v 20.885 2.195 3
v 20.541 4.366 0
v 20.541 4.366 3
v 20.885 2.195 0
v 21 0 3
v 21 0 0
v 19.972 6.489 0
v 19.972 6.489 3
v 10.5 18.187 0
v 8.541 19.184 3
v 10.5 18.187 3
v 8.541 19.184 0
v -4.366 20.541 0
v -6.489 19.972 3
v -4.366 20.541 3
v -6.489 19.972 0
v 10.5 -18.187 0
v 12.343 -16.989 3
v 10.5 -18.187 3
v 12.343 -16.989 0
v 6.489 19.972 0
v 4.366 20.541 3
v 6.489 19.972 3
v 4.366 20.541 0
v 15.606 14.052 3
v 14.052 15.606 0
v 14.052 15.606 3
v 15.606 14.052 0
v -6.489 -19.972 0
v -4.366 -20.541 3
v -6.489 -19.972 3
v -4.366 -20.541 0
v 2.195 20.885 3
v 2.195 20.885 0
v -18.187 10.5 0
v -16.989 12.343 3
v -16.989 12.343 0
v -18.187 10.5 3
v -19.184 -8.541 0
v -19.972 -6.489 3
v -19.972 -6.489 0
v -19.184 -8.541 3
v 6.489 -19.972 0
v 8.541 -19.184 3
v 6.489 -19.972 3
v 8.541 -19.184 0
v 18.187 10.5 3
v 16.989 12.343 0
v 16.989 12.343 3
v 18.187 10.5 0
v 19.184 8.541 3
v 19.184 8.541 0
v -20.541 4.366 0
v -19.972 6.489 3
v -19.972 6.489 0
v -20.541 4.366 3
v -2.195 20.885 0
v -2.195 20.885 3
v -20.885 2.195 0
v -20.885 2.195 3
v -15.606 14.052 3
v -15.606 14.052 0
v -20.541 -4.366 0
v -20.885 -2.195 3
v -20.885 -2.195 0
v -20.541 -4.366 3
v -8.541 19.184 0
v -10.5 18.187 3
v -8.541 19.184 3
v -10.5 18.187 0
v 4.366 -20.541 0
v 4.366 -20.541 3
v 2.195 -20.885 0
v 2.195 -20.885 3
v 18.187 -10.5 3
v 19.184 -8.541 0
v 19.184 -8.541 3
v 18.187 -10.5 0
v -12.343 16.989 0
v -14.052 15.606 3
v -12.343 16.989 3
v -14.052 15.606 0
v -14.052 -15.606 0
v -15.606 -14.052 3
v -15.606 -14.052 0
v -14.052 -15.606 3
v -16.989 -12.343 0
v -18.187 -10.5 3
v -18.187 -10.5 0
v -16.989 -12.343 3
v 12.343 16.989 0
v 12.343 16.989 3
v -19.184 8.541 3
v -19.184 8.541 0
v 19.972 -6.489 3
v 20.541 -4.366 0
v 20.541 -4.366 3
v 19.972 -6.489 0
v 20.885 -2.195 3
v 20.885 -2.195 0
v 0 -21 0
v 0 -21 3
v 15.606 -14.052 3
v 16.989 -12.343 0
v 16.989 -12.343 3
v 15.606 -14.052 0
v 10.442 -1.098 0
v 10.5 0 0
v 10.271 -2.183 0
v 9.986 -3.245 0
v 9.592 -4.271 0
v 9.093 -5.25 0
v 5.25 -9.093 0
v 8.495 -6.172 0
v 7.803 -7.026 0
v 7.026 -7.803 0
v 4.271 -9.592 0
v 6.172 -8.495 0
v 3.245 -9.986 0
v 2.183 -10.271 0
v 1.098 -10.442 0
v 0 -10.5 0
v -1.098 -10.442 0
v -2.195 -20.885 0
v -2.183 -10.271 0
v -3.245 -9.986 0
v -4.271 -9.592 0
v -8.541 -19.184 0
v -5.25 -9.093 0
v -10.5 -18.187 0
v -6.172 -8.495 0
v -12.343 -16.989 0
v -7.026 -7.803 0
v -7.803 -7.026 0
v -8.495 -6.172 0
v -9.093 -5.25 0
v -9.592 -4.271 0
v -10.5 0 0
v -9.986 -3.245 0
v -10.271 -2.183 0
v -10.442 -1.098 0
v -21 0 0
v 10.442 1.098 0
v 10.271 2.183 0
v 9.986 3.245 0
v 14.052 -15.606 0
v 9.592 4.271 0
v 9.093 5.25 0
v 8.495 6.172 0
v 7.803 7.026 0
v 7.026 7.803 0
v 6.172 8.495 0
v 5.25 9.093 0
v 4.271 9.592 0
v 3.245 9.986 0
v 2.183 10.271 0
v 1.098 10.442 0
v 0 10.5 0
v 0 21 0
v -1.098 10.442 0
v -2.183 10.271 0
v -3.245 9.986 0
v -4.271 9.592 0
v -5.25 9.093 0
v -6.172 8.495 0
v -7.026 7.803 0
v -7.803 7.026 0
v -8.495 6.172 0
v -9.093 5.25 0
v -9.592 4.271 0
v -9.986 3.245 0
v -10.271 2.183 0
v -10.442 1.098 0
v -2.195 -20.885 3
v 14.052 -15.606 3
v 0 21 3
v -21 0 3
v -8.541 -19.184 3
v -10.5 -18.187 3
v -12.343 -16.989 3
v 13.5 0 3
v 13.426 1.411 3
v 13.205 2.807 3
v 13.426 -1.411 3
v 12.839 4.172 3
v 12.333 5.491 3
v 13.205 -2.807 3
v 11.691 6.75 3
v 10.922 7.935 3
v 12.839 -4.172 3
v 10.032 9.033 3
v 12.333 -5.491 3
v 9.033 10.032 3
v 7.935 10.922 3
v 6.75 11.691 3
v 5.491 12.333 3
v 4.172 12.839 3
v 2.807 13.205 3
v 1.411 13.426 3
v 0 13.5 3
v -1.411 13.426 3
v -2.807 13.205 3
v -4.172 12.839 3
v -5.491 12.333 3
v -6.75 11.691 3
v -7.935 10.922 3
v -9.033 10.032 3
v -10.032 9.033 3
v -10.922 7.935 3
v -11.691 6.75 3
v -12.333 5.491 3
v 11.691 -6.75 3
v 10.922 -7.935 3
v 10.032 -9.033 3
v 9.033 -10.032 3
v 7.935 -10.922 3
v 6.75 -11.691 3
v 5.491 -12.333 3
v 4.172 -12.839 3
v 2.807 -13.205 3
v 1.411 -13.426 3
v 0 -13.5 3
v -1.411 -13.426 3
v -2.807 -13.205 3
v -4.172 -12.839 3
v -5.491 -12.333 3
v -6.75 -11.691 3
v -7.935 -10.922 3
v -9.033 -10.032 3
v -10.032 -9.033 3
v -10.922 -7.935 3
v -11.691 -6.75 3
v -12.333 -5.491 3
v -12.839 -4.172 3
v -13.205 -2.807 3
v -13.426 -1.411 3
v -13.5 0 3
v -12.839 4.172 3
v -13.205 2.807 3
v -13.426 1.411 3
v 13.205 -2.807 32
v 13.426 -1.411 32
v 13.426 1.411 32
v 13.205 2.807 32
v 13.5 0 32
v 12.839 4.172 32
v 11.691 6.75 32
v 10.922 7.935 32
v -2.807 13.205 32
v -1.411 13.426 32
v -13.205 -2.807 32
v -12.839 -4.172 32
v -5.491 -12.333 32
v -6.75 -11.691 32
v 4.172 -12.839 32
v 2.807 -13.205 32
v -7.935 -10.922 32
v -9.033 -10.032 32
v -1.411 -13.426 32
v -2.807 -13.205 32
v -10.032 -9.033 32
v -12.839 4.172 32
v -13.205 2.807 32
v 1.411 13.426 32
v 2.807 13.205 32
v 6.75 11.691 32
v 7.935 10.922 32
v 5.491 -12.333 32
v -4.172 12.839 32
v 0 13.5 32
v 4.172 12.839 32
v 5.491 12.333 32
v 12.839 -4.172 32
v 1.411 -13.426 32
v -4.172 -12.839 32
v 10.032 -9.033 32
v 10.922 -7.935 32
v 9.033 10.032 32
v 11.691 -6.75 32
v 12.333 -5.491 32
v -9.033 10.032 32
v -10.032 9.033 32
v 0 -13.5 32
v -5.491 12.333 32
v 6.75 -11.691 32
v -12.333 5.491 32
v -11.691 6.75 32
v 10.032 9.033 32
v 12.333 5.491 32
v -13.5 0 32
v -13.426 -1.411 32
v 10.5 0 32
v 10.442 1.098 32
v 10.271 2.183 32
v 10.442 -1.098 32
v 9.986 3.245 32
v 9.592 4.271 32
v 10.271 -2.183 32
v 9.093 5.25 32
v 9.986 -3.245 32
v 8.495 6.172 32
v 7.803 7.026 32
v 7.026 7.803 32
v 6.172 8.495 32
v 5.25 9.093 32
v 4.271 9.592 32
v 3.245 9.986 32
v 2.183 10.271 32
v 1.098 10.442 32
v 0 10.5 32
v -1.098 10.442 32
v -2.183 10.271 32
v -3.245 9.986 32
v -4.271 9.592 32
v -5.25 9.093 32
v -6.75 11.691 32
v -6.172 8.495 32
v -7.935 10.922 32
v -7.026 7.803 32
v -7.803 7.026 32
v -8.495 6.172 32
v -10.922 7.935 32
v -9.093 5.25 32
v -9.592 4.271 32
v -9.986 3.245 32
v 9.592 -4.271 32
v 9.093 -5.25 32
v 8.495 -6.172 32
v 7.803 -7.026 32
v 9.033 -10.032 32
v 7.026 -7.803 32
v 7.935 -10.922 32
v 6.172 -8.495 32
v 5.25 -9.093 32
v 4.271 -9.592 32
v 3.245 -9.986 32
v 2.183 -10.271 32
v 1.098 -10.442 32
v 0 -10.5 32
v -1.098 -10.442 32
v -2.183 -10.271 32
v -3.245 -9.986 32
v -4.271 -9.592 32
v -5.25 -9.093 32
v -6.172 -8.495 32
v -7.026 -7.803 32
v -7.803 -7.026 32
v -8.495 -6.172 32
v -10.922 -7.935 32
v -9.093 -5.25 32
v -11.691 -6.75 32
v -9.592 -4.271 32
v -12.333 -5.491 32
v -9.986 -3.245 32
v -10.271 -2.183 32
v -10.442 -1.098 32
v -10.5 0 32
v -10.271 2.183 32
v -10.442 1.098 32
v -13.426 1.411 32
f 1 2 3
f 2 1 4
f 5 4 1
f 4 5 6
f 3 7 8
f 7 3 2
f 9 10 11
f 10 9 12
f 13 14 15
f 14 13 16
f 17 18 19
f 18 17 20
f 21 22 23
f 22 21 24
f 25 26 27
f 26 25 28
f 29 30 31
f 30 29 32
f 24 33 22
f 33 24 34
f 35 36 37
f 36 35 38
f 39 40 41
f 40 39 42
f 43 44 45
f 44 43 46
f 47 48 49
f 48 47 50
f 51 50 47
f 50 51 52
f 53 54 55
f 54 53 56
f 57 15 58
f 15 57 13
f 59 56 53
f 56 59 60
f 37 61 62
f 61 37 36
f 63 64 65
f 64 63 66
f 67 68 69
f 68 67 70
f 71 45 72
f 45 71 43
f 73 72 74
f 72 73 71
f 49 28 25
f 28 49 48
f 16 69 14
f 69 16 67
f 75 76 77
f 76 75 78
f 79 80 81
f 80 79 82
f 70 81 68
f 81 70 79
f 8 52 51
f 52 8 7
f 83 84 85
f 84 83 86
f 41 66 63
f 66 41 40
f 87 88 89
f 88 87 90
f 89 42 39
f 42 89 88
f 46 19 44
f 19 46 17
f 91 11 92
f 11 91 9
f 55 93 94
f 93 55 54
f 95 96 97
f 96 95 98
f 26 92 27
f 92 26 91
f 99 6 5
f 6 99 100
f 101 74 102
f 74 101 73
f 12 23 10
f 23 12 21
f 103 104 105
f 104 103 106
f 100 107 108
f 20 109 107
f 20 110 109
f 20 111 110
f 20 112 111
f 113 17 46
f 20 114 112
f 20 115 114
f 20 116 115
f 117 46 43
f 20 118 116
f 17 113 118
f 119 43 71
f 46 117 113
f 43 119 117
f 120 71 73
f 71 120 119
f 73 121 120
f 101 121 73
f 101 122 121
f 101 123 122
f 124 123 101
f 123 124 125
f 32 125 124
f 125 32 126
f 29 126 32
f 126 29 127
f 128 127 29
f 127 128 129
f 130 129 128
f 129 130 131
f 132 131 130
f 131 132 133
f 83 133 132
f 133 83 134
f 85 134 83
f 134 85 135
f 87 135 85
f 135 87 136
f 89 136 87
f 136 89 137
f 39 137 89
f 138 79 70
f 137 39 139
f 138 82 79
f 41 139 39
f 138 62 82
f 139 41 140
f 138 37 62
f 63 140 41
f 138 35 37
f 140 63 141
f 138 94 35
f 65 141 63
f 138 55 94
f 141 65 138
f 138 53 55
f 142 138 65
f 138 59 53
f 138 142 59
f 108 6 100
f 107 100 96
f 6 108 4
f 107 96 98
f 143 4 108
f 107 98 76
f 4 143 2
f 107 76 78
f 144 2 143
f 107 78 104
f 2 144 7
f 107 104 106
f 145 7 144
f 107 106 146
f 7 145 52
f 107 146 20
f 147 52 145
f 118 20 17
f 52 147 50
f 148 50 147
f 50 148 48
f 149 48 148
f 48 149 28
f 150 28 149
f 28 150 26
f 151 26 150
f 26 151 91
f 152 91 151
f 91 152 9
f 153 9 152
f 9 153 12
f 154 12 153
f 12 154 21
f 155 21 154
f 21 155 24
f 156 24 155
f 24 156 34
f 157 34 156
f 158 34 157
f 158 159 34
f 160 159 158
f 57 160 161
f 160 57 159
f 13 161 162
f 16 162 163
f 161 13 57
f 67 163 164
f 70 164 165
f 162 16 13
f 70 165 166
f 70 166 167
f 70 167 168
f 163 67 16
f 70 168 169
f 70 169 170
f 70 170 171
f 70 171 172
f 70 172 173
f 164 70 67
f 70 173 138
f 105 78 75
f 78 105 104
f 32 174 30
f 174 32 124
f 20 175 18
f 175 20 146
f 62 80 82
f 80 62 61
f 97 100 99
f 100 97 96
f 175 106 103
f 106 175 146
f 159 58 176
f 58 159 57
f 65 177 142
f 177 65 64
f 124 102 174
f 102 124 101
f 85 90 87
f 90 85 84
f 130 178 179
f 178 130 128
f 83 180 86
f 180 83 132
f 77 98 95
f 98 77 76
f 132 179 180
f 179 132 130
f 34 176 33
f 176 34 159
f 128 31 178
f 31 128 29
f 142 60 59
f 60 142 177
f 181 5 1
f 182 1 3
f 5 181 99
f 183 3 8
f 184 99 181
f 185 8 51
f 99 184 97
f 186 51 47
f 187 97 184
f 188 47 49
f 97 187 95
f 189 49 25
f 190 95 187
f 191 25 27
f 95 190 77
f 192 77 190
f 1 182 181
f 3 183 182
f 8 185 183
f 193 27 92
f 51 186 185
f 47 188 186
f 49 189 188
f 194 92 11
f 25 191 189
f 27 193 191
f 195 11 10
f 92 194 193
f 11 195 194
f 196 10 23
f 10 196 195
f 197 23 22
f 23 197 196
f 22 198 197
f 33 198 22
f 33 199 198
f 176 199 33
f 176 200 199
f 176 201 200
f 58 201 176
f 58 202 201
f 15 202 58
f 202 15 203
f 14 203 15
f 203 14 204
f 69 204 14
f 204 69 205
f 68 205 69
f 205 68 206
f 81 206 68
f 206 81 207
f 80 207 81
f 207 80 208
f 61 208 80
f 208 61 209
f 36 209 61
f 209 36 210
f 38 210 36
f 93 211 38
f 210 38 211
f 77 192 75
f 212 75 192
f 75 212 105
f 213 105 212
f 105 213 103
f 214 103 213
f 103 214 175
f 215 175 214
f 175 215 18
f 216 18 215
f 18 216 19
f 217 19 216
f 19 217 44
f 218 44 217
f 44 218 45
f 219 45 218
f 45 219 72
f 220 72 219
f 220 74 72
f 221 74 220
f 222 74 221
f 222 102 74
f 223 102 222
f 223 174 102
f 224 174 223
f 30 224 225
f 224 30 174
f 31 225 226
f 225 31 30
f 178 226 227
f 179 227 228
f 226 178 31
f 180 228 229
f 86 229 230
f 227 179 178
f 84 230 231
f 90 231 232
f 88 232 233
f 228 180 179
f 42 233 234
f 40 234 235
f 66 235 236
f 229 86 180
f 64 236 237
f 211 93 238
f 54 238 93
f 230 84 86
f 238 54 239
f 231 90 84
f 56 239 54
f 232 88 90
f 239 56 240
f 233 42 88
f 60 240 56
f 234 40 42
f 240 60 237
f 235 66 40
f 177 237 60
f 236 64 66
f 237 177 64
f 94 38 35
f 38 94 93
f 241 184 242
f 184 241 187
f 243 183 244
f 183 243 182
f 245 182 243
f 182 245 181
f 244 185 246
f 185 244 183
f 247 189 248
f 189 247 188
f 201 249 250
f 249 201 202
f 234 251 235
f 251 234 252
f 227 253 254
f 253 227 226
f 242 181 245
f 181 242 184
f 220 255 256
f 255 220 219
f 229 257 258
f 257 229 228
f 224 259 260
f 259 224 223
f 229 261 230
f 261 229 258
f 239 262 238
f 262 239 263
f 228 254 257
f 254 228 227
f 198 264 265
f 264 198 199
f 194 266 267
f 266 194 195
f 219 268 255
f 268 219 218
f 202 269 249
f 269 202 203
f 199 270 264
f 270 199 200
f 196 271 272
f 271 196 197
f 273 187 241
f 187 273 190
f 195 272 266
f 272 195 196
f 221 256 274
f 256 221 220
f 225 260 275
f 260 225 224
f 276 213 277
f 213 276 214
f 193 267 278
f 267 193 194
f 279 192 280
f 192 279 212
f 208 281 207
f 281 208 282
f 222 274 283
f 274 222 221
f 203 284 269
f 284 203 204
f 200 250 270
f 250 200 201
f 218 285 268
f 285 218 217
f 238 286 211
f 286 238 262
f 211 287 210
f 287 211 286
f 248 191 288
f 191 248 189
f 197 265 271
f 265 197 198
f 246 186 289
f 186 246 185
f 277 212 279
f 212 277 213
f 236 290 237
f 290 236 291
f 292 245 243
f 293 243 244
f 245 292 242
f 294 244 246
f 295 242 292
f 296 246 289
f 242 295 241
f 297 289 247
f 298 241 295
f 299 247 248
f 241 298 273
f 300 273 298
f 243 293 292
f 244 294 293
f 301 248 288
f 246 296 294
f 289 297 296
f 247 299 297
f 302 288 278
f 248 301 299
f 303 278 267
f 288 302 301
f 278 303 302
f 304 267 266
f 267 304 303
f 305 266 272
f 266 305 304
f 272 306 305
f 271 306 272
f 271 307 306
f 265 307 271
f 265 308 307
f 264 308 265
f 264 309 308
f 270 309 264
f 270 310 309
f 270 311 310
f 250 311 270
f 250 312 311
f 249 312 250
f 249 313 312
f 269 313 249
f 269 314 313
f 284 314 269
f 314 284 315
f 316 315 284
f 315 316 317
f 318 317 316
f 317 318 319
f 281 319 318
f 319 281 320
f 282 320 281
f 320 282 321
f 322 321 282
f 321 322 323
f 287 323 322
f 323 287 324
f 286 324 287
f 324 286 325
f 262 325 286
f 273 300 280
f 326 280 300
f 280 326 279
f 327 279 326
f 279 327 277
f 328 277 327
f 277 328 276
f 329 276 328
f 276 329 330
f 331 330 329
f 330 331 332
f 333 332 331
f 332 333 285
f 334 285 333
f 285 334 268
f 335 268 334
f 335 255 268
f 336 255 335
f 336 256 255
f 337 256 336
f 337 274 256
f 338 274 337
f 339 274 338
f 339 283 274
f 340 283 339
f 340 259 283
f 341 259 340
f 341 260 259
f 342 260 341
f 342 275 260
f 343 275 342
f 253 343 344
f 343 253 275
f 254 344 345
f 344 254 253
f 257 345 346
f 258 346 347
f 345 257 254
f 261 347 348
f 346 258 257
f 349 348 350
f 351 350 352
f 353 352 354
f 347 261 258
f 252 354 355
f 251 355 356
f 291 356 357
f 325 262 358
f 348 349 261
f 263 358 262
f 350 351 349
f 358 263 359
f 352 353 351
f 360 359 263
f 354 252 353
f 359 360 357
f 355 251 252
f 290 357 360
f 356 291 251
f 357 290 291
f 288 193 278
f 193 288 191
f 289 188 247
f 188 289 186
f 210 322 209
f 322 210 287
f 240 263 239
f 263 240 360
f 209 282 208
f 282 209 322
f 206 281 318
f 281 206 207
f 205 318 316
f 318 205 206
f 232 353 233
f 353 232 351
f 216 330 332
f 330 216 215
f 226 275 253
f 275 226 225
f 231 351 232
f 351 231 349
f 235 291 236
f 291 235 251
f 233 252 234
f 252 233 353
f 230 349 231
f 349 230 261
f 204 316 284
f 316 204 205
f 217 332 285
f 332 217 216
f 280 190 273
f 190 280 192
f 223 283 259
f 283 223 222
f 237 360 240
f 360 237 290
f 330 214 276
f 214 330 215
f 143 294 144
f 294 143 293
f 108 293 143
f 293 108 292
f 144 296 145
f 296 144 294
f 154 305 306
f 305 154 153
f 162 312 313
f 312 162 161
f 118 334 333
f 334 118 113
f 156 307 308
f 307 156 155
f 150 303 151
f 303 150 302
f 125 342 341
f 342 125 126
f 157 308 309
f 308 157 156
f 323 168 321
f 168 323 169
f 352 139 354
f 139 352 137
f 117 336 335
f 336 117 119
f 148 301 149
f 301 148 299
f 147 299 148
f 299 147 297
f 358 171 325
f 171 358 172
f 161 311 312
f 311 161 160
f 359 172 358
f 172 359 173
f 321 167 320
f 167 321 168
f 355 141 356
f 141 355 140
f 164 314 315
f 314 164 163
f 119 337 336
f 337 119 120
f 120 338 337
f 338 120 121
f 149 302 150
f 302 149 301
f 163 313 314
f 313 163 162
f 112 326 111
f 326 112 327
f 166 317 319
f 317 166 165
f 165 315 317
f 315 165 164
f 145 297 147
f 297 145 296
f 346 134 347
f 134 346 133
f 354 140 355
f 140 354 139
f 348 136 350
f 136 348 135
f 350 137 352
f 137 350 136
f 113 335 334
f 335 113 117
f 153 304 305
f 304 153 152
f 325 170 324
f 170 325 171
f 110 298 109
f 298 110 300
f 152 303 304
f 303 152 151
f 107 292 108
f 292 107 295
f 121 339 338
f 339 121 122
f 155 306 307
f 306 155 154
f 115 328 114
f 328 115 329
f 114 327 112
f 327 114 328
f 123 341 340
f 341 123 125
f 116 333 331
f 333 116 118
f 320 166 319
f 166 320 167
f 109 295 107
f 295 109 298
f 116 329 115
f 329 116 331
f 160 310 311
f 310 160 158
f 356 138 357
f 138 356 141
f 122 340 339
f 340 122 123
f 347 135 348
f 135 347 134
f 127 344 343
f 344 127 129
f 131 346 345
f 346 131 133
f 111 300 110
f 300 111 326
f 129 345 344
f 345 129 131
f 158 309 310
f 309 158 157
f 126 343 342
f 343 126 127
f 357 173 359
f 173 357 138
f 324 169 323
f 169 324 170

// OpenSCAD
// Threaded mounting boss.
$fn = 60;
eps = 0.02;
thread_d = 21;
base_d = 42;
height = 32;
difference() { union() { cylinder(d=base_d,h=3); cylinder(d=thread_d+6,h=height); } translate([0,0,-eps]) cylinder(d=thread_d,h=height+2*eps); }
